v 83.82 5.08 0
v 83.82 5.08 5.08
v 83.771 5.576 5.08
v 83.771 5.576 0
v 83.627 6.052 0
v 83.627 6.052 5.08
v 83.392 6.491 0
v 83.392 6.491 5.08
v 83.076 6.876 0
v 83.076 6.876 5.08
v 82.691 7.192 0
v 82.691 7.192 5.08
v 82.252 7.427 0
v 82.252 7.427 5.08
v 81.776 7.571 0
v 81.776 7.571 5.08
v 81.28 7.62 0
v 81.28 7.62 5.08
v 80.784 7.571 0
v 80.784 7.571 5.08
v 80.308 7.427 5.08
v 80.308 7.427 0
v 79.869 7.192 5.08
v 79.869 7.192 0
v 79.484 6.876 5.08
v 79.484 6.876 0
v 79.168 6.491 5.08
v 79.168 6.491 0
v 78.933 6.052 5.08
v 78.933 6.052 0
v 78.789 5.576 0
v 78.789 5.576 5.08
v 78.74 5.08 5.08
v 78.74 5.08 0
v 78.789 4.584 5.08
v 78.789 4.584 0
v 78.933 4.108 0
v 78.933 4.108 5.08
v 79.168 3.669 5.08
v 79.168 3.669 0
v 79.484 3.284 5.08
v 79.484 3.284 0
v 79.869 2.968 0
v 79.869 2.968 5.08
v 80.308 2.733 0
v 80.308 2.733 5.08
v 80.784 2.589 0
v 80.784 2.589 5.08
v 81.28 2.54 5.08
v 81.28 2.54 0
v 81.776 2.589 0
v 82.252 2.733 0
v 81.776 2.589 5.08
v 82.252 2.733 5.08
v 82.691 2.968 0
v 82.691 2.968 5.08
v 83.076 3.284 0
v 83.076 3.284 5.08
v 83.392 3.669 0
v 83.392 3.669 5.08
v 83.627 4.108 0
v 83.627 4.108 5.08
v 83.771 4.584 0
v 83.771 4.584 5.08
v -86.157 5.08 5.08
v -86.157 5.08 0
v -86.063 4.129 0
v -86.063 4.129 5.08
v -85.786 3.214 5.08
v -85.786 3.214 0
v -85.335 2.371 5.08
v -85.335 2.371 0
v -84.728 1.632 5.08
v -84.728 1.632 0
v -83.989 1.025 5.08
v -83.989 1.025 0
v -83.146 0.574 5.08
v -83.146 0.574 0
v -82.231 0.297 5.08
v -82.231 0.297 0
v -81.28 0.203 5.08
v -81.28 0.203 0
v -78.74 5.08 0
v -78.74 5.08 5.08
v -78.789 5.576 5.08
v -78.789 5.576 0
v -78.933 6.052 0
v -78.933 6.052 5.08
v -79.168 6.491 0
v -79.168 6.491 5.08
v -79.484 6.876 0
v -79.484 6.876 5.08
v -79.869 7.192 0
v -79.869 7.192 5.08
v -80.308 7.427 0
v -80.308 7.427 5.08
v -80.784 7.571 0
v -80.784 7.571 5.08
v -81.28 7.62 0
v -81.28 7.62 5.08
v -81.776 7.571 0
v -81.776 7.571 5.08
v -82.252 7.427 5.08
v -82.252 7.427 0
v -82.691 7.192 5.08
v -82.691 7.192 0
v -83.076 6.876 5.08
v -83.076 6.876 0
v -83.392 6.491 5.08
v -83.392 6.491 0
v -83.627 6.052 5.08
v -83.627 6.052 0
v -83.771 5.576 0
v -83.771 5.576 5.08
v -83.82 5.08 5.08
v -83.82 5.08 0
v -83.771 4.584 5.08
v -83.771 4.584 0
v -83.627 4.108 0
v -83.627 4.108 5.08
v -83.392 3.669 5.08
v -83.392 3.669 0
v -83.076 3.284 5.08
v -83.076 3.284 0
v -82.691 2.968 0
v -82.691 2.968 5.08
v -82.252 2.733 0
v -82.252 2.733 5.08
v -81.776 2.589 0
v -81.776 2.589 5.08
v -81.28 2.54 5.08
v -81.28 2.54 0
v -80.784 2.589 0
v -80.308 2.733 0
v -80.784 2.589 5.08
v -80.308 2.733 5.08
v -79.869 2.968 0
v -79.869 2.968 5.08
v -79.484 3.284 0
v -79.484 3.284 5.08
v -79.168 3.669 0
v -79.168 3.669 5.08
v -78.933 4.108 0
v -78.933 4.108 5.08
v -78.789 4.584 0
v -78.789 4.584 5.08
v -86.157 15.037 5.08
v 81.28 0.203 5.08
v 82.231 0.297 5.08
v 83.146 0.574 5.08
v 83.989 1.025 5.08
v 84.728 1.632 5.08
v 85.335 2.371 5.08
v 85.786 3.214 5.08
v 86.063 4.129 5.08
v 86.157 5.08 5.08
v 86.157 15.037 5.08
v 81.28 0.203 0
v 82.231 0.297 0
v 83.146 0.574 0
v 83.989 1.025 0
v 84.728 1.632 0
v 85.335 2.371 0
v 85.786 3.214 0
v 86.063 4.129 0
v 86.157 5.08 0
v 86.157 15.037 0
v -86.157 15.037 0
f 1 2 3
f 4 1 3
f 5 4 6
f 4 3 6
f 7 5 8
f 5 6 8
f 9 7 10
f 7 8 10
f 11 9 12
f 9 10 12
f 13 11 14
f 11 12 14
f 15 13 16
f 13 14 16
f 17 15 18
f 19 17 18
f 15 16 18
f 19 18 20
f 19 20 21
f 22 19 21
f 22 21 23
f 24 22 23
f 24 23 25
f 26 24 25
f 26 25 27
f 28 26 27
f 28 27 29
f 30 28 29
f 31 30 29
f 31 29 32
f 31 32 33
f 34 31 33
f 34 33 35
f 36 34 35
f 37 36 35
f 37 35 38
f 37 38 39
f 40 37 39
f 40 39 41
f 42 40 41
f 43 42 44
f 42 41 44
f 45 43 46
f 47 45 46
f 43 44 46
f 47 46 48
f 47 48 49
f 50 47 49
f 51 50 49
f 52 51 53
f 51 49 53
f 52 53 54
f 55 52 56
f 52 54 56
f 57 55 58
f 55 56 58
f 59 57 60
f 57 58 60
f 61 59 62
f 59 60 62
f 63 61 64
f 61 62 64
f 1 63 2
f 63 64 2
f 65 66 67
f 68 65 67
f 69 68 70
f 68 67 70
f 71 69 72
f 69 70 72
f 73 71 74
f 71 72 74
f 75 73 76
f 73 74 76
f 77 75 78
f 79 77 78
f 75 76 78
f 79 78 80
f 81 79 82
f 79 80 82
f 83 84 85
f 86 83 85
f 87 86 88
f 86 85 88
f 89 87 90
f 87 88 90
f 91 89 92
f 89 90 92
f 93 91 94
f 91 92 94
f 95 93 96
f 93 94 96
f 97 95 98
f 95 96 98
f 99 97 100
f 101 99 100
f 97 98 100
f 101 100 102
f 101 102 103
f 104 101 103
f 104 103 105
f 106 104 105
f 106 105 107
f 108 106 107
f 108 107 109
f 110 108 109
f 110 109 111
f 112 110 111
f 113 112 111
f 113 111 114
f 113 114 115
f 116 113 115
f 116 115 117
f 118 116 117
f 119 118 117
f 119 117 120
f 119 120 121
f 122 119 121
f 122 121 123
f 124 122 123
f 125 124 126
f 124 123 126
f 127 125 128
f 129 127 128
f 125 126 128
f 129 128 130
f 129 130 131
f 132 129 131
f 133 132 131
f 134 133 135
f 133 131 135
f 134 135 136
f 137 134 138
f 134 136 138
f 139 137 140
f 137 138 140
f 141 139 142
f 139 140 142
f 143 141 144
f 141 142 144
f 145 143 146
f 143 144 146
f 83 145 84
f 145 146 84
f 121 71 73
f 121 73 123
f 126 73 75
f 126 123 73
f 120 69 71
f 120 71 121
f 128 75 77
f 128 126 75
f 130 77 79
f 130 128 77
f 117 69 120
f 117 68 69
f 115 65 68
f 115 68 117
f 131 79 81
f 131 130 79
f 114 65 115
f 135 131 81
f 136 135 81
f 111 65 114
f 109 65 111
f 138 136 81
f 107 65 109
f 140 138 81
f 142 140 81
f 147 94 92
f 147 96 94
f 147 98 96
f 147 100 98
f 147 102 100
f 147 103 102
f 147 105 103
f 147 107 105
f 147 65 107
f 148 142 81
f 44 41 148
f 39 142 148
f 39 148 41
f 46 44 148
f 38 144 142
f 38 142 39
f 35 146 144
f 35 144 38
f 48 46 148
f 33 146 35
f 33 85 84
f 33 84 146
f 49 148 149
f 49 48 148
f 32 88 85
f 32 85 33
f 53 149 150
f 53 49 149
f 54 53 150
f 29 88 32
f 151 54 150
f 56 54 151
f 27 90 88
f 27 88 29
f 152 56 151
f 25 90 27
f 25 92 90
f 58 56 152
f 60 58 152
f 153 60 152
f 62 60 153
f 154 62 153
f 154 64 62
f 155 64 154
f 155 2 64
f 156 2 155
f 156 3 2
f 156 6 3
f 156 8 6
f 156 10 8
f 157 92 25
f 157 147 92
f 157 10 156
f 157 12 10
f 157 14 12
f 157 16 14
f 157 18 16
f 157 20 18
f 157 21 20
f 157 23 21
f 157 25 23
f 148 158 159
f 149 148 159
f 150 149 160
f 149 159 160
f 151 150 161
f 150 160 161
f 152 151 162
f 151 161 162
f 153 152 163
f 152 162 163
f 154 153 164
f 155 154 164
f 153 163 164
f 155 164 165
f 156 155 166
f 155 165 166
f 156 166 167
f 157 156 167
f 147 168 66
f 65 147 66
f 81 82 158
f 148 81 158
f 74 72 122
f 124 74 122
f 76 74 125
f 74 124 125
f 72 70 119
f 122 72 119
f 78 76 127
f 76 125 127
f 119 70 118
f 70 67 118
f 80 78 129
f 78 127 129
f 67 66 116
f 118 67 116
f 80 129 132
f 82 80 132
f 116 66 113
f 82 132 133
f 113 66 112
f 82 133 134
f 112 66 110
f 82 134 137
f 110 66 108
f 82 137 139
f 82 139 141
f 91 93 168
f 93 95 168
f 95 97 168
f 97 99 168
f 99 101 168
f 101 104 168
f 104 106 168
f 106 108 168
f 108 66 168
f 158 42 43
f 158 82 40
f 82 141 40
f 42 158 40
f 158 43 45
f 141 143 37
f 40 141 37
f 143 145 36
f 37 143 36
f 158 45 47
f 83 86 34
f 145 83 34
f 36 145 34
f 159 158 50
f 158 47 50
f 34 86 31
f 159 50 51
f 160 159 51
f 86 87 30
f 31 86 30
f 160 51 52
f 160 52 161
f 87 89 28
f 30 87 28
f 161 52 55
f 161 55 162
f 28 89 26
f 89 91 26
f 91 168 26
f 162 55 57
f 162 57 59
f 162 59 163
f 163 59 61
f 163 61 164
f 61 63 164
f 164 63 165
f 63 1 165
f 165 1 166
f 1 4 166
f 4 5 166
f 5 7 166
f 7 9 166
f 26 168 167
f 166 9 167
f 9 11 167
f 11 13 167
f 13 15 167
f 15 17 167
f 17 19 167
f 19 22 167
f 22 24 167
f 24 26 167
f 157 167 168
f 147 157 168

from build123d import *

# Parameters (mm, degrees)
F1_DEPTH = 5.08
F2_R     = 2.54
F3_DEPTH = 5.081


with BuildPart() as f1:
    # F0 (on Top) → F1 (new body)
    with BuildSketch(Plane.XY):
        with BuildLine():
            Line((86.1568, 15.0368), (-86.1568, 15.0368))
            Line((-86.1568, 15.0368), (-86.1568, 5.08))
            ThreePointArc((-86.1568, 5.08), (-84.728418, 1.631582), (-81.28, 0.2032))
            Line((-81.28, 0.2032), (81.28, 0.2032))
            ThreePointArc((81.28, 0.2032), (84.728418, 1.631582), (86.1568, 5.08))
            Line((86.1568, 5.08), (86.1568, 15.0368))
        make_face()
    extrude(amount=F1_DEPTH)

    # F2 (on face) → F3 (cut, through all)
    with BuildSketch(Plane.XY.offset(5.08)):
        with Locations((-81.28, 5.08)):
            Circle(F2_R)
        with Locations((81.28, 5.08)):
            Circle(F2_R)
    extrude(amount=-F3_DEPTH, mode=Mode.SUBTRACT)


solid = f1.part
